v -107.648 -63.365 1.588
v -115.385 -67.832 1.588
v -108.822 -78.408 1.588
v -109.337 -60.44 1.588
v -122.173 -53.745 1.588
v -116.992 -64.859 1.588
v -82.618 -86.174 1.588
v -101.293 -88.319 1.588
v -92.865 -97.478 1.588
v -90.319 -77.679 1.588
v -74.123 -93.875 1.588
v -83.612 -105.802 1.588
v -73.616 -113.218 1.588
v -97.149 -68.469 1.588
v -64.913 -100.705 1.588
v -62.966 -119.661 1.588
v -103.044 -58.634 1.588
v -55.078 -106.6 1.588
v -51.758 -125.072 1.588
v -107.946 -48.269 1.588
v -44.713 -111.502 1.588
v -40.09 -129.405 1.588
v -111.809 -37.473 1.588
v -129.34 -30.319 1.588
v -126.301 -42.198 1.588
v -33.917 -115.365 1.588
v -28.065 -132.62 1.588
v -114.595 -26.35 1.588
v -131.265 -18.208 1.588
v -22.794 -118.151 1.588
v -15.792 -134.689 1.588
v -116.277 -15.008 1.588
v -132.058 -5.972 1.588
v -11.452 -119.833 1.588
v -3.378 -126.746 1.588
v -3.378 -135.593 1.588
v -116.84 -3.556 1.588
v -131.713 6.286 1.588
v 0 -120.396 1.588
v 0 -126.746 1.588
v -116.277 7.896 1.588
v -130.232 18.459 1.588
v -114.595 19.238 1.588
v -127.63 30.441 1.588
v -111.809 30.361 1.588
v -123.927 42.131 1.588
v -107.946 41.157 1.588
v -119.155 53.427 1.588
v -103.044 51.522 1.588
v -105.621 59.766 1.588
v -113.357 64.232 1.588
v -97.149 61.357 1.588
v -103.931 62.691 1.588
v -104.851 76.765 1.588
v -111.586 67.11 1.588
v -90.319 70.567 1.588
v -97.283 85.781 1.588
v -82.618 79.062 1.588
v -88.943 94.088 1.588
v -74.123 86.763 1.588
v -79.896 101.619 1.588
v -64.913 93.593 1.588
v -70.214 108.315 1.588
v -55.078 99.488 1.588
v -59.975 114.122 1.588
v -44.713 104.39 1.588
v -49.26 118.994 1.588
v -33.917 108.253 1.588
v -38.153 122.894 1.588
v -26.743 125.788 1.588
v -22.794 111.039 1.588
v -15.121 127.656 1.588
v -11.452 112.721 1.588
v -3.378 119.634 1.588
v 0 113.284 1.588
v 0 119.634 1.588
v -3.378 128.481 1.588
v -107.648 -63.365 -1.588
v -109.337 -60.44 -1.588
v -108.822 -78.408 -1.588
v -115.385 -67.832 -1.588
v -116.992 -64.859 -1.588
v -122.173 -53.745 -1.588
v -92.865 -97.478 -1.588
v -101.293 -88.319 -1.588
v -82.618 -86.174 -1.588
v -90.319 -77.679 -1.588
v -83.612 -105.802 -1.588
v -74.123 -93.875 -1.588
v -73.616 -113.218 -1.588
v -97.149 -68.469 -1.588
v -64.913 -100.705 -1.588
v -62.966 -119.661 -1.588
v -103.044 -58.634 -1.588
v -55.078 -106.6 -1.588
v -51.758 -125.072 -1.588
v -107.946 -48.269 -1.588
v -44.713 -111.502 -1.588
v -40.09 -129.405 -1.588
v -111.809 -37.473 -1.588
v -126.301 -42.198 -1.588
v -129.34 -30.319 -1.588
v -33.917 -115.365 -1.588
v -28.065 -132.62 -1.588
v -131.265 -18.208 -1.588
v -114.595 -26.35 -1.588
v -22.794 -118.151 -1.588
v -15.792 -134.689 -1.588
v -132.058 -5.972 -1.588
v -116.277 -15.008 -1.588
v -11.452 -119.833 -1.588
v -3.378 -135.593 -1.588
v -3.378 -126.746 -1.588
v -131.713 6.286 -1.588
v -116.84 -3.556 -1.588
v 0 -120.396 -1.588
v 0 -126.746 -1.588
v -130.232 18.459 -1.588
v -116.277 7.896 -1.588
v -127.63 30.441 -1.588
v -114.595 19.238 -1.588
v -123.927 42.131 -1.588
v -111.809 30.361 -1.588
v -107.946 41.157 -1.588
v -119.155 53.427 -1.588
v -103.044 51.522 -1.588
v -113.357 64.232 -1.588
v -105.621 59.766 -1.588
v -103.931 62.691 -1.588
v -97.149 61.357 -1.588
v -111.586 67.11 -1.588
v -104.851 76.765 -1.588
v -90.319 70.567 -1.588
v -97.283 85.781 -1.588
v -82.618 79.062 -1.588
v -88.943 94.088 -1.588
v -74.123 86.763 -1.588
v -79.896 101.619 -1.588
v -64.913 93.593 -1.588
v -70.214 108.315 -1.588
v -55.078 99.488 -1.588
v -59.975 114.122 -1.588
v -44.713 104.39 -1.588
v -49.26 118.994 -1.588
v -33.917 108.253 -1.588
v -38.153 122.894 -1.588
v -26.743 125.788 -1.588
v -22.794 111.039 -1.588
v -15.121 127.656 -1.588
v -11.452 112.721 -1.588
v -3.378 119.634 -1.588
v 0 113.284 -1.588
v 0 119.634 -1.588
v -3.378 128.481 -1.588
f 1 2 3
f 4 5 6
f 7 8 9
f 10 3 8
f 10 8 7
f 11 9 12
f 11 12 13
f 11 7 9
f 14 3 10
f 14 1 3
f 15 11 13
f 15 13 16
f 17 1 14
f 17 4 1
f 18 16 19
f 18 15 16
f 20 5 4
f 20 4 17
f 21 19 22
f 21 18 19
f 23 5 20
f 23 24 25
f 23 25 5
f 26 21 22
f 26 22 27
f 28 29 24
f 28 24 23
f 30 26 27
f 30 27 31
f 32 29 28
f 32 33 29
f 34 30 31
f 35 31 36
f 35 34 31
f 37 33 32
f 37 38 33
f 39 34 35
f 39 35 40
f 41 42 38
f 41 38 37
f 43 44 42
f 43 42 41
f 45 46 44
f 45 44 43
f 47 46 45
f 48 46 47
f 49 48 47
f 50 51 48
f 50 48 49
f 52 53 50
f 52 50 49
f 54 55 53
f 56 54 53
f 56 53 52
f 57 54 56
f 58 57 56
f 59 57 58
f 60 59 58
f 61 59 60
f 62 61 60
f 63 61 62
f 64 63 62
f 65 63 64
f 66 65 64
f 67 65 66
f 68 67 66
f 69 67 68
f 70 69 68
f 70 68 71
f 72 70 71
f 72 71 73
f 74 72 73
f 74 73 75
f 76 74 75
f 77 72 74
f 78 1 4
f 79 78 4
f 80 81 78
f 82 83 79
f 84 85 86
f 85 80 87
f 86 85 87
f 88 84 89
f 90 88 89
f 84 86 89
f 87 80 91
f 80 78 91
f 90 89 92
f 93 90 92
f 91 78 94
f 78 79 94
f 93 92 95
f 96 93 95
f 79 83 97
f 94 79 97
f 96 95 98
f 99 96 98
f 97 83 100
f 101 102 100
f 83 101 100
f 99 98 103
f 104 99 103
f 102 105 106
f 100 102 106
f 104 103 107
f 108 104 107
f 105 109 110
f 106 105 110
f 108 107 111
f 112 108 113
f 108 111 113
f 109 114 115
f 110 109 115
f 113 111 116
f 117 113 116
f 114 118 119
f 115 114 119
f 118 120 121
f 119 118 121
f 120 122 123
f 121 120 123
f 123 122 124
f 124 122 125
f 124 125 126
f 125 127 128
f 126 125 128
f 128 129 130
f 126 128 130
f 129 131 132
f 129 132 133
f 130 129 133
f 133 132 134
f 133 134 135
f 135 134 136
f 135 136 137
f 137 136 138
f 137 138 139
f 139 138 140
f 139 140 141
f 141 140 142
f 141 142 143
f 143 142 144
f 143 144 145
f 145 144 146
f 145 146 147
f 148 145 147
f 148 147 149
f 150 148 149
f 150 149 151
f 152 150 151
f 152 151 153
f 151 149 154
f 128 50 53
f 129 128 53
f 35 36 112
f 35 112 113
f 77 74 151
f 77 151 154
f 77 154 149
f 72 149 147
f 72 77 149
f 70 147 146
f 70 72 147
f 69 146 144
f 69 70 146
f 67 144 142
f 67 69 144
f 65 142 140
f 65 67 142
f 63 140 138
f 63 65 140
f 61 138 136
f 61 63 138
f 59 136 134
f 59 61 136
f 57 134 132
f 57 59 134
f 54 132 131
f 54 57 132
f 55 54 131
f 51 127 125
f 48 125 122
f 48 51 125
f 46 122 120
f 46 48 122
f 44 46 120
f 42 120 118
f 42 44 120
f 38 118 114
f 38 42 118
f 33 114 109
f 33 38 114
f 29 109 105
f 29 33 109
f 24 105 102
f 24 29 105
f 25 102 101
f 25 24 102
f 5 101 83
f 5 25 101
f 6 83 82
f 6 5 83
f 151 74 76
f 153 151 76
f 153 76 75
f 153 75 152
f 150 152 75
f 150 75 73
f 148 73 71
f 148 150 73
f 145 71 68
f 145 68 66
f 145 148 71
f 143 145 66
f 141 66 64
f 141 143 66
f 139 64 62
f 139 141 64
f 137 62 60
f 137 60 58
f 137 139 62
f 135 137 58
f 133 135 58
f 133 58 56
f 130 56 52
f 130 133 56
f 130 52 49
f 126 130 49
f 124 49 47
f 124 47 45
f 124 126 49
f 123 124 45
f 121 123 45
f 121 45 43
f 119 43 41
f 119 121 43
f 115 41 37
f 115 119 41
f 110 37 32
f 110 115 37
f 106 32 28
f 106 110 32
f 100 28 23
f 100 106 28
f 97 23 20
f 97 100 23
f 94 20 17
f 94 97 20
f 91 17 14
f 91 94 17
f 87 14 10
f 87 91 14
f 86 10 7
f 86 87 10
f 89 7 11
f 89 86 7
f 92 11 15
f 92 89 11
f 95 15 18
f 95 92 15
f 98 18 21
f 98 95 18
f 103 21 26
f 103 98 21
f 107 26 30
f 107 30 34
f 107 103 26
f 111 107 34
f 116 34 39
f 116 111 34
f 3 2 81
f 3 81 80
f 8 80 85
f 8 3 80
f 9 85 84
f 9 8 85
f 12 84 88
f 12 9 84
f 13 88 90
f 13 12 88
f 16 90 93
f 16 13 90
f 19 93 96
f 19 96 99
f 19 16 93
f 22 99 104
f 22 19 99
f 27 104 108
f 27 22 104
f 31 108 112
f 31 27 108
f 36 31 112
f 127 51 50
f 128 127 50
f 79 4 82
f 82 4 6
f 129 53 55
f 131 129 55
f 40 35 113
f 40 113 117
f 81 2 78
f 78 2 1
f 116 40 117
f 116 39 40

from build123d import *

# Parameters (mm, degrees)
SKETCH2_R           = 116.84
BOSS_EXTRUDE1_DEPTH = 1.5875
SKETCH3_W           = 232.210592103
SKETCH3_H           = 398.954583541
CUT_EXTRUDE1_DEPTH  = 133.08
SKETCH4_W           = 3.3782
SKETCH4_H           = 10.16
CUT_EXTRUDE2_DEPTH  = 4.175


with BuildPart() as part:
    # Sketch2 → Boss-Extrude1 (new body, symmetric)
    with BuildSketch(Plane.XY):
        with BuildLine():
            ThreePointArc((-1.651, 128.513680847), (-113.443755652, 64.087482344), (-116.974071472, -64.89271823))
            ThreePointArc((-116.974071472, -64.89271823), (-116.588202689, -65.623039511), (-116.197774242, -66.350933404))
            ThreePointArc((-116.197774242, -66.350933404), (-115.802941233, -67.076116512), (-115.403582459, -67.798817153))
            ThreePointArc((-115.403582459, -67.798817153), (0, -135.636), (115.403582459, -67.798817153))
            ThreePointArc((115.403582459, -67.798817153), (115.802941375, -67.076116254), (116.197774523, -66.350932884))
            ThreePointArc((116.197774523, -66.350932884), (116.588202828, -65.62303925), (116.974071472, -64.89271823))
            ThreePointArc((116.974071472, -64.89271823), (113.443755652, 64.087482344), (1.651, 128.513680847))
            ThreePointArc((1.651, 128.513680847), (0.825516124, 128.521420187), (0, 128.524))
            ThreePointArc((0, 128.524), (-0.825516124, 128.521420187), (-1.651, 128.513680847))
        make_face()
        with Locations((0, -3.556)):
            Circle(SKETCH2_R, mode=Mode.SUBTRACT)
    extrude(amount=BOSS_EXTRUDE1_DEPTH, both=True)

    # Sketch3 → Cut-Extrude1 (cut, through all)
    with BuildSketch(Plane(origin=(0, 0, 0), x_dir=(0, 0, -1), z_dir=(1, 0, 0))):
        with Locations((6.714523145, -6.913261573)):
            Rectangle(SKETCH3_W, SKETCH3_H)
    extrude(amount=CUT_EXTRUDE1_DEPTH, mode=Mode.SUBTRACT)

    # Sketch4 → Cut-Extrude2 (cut, through all)
    with BuildSketch(Plane.XY.offset(1.5875)):
        with Locations((-1.6891, 124.714)):
            Rectangle(SKETCH4_W, SKETCH4_H)
        Polygon((-105.620566898, 59.765541567), (-103.931466898, 62.691148586), (-112.730285, 67.771148586), (-114.419385, 64.845541567), align=None)
        with Locations((-1.6891, -131.826)):
            Rectangle(SKETCH4_W, SKETCH4_H)
        Polygon((-107.648347053, -63.365323312), (-109.337447053, -60.439716293), (-118.136265155, -65.519716293), (-116.447165155, -68.445323312), align=None)
    extrude(amount=-CUT_EXTRUDE2_DEPTH, mode=Mode.SUBTRACT)


solid = part.part
